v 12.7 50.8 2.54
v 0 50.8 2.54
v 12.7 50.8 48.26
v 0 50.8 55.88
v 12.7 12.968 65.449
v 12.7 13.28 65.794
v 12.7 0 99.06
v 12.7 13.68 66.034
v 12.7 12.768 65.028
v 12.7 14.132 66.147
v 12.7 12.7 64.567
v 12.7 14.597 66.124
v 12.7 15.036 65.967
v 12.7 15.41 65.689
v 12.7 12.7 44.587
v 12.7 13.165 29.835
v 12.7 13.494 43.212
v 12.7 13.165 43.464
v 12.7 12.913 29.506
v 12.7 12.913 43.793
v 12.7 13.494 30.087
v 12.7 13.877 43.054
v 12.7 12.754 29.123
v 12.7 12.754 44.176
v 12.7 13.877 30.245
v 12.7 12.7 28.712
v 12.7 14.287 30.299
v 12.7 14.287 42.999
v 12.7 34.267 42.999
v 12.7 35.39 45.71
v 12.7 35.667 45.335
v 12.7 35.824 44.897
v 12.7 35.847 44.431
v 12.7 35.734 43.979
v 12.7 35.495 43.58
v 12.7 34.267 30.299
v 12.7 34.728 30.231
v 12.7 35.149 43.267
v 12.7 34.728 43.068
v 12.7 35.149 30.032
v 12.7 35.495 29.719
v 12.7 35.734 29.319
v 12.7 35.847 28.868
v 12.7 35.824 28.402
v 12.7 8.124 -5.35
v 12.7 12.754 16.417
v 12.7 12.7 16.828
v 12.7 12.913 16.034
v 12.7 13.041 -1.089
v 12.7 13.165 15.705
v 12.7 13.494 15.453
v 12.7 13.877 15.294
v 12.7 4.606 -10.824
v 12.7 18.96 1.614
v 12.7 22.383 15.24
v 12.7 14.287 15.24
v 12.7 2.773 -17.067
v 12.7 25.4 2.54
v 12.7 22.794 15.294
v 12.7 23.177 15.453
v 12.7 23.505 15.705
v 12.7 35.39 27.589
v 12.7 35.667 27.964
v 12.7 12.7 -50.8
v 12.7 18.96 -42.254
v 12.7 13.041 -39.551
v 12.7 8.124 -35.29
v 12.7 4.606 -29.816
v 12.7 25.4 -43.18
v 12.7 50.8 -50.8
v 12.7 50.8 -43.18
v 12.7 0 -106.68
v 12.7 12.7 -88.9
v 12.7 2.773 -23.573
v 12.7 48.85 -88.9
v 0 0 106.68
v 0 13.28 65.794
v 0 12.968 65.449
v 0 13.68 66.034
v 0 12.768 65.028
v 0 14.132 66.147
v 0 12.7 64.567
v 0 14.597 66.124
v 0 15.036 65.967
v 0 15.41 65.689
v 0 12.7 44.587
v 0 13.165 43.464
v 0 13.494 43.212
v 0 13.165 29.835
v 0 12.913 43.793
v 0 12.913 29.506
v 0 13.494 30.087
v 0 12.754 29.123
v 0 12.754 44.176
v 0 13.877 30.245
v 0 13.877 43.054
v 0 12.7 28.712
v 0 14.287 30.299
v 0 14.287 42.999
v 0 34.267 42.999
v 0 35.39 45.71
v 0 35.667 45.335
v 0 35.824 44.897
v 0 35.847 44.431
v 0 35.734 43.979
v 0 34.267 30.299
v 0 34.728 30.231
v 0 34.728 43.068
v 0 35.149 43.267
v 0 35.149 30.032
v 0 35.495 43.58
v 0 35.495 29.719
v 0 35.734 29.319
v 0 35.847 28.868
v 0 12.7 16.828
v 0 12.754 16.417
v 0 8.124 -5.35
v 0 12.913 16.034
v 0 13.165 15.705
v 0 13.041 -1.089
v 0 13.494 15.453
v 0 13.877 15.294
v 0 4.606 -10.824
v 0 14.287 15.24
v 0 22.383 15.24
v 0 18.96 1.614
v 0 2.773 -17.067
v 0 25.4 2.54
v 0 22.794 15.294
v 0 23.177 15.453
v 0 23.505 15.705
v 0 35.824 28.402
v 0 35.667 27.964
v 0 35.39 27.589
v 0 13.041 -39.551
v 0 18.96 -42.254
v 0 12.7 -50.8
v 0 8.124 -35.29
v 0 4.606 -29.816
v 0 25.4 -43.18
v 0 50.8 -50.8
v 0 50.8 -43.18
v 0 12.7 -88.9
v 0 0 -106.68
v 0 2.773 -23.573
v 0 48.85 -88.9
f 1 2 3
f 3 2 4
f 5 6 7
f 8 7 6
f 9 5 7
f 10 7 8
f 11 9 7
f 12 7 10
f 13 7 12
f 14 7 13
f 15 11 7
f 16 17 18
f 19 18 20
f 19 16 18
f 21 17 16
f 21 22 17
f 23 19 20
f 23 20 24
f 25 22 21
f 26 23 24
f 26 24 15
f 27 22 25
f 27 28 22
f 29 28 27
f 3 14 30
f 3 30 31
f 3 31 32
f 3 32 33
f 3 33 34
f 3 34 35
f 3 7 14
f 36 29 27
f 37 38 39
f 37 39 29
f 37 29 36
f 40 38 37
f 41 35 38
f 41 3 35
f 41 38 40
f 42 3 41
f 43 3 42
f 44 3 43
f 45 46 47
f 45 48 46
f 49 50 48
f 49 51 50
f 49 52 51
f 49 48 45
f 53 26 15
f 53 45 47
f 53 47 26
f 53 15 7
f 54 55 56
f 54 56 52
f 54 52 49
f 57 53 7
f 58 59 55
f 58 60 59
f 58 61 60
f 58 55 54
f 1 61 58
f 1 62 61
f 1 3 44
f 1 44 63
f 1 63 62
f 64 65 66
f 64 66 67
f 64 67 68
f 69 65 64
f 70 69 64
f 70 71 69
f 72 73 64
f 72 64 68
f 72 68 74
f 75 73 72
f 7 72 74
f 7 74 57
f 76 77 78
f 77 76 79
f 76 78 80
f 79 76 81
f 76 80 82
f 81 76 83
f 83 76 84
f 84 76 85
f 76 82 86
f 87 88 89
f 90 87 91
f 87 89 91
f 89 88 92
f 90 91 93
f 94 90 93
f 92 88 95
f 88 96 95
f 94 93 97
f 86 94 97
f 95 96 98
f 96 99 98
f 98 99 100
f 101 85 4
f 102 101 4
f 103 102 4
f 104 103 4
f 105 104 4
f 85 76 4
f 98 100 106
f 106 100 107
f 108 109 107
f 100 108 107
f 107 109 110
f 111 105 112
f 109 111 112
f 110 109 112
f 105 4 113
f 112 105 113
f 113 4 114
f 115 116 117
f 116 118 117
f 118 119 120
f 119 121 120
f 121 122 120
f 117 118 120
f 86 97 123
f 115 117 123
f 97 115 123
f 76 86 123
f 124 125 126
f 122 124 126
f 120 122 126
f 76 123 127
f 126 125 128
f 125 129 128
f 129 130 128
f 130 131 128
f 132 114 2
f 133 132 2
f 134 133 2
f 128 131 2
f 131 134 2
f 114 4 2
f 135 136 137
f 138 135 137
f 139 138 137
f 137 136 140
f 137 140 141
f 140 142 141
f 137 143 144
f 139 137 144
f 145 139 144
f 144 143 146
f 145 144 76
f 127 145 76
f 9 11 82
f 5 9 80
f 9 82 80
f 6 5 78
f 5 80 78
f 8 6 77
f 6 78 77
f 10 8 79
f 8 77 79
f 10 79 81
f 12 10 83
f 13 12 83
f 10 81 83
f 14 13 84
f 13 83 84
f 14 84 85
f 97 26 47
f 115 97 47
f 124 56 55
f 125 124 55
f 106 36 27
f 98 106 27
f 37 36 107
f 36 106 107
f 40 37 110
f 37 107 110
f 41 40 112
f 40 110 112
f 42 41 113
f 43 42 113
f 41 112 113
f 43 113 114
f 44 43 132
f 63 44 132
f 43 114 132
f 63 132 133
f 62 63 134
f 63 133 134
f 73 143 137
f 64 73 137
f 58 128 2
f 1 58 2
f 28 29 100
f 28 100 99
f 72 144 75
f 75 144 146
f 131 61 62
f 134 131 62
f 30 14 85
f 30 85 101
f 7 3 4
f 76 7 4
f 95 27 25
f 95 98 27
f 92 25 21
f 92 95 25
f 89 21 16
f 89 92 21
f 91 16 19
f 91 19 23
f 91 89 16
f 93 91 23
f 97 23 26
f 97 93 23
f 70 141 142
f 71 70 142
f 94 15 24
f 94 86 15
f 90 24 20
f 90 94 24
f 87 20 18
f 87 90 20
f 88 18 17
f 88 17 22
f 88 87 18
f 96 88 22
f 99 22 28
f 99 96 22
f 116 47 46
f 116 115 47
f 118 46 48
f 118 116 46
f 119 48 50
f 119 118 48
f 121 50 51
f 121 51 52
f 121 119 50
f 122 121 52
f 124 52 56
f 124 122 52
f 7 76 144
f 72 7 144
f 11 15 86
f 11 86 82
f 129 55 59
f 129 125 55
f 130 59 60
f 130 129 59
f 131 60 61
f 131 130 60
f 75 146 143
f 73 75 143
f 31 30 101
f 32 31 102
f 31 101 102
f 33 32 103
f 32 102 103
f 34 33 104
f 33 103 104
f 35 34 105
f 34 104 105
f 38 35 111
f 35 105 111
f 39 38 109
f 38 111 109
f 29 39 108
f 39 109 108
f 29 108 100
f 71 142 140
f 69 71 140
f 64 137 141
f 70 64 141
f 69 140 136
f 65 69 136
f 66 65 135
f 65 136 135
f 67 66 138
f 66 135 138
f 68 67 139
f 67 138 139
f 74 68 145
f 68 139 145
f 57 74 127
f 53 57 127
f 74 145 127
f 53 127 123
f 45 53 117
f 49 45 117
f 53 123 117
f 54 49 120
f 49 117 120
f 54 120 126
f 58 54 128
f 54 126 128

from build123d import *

# Parameters (mm, degrees)
BOSS_EXTRUDE1_DEPTH = 12.7
CUT_EXTRUDE1_DEPTH  = 71.842048969
CUT_EXTRUDE2_REACH  = 120.838
FILLET1_R           = 1.5875


with BuildPart() as part:
    # Sketch1 → Boss-Extrude1 (new body)
    with BuildSketch(Plane(origin=(0, 0, 0), x_dir=(0, 0, -1), z_dir=(1, 0, 0))):
        with BuildLine():
            Line((-55.88, 50.8), (-106.68, 0))
            Line((-106.68, 0), (106.68, 0))
            Line((106.68, 0), (88.9, 48.850148518))
            Line((88.9, 48.850148518), (88.9, 12.7))
            Line((88.9, 12.7), (50.8, 12.7))
            Line((50.8, 12.7), (50.8, 50.8))
            Line((50.8, 50.8), (43.18, 50.8))
            Line((43.18, 50.8), (43.18, 25.4))
            ThreePointArc((43.18, 25.4), (20.32, 2.54), (-2.54, 25.4))
            Line((-2.54, 25.4), (-2.54, 50.8))
            Line((-2.54, 50.8), (-55.88, 50.8))
        make_face()
    extrude(amount=BOSS_EXTRUDE1_DEPTH)

    # Sketch2 → Cut-Extrude1 (cut, along a direction that is not the sketch's normal)
    with BuildSketch(Plane.XZ):
        Polygon((0, 106.68), (12.7, 106.68), (12.7, 99.06), align=None)
    extrude(amount=-CUT_EXTRUDE1_DEPTH, dir=(0, -0.7071067811865438, 0.7071067811865512), mode=Mode.SUBTRACT)

    # Sketch3 → Cut-Extrude2 (cut, up to next)
    with BuildSketch(Plane(origin=(12.7, 0, 0), x_dir=(0, 0, -1), z_dir=(1, 0, 0)), mode=Mode.PRIVATE) as cut_extrude2_sk1:
        Polygon((-42.999487758, 12.7), (-68.399487758, 12.7), (-42.999487758, 38.1), align=None)
    cut_extrude2_tool1 = extrude(cut_extrude2_sk1.sketch, amount=-CUT_EXTRUDE2_REACH, mode=Mode.PRIVATE) & part.part
    # Sketch3 → Cut-Extrude2 (cut, up to next)
    with BuildSketch(Plane(origin=(12.7, 0, 0), x_dir=(0, 0, -1), z_dir=(1, 0, 0)), mode=Mode.PRIVATE) as cut_extrude2_sk2:
        Polygon((-15.24, 23.040512242), (-30.299487758, 38.1), (-30.299487758, 12.7), (-15.24, 12.7), align=None)
    cut_extrude2_tool2 = extrude(cut_extrude2_sk2.sketch, amount=-CUT_EXTRUDE2_REACH, mode=Mode.PRIVATE) & part.part
    add(cut_extrude2_tool1.solids().sort_by_distance((12.7, 21.166667, 51.466154))[0], mode=Mode.SUBTRACT)
    add(cut_extrude2_tool2.solids().sort_by_distance((12.7, 22.163912, 23.827312))[0], mode=Mode.SUBTRACT)

    # Fillet1
    fillet1_edges = [part.edges().sort_by_distance(p)[0] for p in [
        (6.35, 12.7, 42.999487758),
        (6.35, 12.7, 68.399487758),
        (6.35, 38.1, 42.999487758),
        (6.35, 23.040512242, 15.24),
        (6.35, 12.7, 15.24),
        (6.35, 12.7, 30.299487758),
        (6.35, 38.1, 30.299487758),
    ]]
    fillet(fillet1_edges, radius=FILLET1_R)


solid = part.part
